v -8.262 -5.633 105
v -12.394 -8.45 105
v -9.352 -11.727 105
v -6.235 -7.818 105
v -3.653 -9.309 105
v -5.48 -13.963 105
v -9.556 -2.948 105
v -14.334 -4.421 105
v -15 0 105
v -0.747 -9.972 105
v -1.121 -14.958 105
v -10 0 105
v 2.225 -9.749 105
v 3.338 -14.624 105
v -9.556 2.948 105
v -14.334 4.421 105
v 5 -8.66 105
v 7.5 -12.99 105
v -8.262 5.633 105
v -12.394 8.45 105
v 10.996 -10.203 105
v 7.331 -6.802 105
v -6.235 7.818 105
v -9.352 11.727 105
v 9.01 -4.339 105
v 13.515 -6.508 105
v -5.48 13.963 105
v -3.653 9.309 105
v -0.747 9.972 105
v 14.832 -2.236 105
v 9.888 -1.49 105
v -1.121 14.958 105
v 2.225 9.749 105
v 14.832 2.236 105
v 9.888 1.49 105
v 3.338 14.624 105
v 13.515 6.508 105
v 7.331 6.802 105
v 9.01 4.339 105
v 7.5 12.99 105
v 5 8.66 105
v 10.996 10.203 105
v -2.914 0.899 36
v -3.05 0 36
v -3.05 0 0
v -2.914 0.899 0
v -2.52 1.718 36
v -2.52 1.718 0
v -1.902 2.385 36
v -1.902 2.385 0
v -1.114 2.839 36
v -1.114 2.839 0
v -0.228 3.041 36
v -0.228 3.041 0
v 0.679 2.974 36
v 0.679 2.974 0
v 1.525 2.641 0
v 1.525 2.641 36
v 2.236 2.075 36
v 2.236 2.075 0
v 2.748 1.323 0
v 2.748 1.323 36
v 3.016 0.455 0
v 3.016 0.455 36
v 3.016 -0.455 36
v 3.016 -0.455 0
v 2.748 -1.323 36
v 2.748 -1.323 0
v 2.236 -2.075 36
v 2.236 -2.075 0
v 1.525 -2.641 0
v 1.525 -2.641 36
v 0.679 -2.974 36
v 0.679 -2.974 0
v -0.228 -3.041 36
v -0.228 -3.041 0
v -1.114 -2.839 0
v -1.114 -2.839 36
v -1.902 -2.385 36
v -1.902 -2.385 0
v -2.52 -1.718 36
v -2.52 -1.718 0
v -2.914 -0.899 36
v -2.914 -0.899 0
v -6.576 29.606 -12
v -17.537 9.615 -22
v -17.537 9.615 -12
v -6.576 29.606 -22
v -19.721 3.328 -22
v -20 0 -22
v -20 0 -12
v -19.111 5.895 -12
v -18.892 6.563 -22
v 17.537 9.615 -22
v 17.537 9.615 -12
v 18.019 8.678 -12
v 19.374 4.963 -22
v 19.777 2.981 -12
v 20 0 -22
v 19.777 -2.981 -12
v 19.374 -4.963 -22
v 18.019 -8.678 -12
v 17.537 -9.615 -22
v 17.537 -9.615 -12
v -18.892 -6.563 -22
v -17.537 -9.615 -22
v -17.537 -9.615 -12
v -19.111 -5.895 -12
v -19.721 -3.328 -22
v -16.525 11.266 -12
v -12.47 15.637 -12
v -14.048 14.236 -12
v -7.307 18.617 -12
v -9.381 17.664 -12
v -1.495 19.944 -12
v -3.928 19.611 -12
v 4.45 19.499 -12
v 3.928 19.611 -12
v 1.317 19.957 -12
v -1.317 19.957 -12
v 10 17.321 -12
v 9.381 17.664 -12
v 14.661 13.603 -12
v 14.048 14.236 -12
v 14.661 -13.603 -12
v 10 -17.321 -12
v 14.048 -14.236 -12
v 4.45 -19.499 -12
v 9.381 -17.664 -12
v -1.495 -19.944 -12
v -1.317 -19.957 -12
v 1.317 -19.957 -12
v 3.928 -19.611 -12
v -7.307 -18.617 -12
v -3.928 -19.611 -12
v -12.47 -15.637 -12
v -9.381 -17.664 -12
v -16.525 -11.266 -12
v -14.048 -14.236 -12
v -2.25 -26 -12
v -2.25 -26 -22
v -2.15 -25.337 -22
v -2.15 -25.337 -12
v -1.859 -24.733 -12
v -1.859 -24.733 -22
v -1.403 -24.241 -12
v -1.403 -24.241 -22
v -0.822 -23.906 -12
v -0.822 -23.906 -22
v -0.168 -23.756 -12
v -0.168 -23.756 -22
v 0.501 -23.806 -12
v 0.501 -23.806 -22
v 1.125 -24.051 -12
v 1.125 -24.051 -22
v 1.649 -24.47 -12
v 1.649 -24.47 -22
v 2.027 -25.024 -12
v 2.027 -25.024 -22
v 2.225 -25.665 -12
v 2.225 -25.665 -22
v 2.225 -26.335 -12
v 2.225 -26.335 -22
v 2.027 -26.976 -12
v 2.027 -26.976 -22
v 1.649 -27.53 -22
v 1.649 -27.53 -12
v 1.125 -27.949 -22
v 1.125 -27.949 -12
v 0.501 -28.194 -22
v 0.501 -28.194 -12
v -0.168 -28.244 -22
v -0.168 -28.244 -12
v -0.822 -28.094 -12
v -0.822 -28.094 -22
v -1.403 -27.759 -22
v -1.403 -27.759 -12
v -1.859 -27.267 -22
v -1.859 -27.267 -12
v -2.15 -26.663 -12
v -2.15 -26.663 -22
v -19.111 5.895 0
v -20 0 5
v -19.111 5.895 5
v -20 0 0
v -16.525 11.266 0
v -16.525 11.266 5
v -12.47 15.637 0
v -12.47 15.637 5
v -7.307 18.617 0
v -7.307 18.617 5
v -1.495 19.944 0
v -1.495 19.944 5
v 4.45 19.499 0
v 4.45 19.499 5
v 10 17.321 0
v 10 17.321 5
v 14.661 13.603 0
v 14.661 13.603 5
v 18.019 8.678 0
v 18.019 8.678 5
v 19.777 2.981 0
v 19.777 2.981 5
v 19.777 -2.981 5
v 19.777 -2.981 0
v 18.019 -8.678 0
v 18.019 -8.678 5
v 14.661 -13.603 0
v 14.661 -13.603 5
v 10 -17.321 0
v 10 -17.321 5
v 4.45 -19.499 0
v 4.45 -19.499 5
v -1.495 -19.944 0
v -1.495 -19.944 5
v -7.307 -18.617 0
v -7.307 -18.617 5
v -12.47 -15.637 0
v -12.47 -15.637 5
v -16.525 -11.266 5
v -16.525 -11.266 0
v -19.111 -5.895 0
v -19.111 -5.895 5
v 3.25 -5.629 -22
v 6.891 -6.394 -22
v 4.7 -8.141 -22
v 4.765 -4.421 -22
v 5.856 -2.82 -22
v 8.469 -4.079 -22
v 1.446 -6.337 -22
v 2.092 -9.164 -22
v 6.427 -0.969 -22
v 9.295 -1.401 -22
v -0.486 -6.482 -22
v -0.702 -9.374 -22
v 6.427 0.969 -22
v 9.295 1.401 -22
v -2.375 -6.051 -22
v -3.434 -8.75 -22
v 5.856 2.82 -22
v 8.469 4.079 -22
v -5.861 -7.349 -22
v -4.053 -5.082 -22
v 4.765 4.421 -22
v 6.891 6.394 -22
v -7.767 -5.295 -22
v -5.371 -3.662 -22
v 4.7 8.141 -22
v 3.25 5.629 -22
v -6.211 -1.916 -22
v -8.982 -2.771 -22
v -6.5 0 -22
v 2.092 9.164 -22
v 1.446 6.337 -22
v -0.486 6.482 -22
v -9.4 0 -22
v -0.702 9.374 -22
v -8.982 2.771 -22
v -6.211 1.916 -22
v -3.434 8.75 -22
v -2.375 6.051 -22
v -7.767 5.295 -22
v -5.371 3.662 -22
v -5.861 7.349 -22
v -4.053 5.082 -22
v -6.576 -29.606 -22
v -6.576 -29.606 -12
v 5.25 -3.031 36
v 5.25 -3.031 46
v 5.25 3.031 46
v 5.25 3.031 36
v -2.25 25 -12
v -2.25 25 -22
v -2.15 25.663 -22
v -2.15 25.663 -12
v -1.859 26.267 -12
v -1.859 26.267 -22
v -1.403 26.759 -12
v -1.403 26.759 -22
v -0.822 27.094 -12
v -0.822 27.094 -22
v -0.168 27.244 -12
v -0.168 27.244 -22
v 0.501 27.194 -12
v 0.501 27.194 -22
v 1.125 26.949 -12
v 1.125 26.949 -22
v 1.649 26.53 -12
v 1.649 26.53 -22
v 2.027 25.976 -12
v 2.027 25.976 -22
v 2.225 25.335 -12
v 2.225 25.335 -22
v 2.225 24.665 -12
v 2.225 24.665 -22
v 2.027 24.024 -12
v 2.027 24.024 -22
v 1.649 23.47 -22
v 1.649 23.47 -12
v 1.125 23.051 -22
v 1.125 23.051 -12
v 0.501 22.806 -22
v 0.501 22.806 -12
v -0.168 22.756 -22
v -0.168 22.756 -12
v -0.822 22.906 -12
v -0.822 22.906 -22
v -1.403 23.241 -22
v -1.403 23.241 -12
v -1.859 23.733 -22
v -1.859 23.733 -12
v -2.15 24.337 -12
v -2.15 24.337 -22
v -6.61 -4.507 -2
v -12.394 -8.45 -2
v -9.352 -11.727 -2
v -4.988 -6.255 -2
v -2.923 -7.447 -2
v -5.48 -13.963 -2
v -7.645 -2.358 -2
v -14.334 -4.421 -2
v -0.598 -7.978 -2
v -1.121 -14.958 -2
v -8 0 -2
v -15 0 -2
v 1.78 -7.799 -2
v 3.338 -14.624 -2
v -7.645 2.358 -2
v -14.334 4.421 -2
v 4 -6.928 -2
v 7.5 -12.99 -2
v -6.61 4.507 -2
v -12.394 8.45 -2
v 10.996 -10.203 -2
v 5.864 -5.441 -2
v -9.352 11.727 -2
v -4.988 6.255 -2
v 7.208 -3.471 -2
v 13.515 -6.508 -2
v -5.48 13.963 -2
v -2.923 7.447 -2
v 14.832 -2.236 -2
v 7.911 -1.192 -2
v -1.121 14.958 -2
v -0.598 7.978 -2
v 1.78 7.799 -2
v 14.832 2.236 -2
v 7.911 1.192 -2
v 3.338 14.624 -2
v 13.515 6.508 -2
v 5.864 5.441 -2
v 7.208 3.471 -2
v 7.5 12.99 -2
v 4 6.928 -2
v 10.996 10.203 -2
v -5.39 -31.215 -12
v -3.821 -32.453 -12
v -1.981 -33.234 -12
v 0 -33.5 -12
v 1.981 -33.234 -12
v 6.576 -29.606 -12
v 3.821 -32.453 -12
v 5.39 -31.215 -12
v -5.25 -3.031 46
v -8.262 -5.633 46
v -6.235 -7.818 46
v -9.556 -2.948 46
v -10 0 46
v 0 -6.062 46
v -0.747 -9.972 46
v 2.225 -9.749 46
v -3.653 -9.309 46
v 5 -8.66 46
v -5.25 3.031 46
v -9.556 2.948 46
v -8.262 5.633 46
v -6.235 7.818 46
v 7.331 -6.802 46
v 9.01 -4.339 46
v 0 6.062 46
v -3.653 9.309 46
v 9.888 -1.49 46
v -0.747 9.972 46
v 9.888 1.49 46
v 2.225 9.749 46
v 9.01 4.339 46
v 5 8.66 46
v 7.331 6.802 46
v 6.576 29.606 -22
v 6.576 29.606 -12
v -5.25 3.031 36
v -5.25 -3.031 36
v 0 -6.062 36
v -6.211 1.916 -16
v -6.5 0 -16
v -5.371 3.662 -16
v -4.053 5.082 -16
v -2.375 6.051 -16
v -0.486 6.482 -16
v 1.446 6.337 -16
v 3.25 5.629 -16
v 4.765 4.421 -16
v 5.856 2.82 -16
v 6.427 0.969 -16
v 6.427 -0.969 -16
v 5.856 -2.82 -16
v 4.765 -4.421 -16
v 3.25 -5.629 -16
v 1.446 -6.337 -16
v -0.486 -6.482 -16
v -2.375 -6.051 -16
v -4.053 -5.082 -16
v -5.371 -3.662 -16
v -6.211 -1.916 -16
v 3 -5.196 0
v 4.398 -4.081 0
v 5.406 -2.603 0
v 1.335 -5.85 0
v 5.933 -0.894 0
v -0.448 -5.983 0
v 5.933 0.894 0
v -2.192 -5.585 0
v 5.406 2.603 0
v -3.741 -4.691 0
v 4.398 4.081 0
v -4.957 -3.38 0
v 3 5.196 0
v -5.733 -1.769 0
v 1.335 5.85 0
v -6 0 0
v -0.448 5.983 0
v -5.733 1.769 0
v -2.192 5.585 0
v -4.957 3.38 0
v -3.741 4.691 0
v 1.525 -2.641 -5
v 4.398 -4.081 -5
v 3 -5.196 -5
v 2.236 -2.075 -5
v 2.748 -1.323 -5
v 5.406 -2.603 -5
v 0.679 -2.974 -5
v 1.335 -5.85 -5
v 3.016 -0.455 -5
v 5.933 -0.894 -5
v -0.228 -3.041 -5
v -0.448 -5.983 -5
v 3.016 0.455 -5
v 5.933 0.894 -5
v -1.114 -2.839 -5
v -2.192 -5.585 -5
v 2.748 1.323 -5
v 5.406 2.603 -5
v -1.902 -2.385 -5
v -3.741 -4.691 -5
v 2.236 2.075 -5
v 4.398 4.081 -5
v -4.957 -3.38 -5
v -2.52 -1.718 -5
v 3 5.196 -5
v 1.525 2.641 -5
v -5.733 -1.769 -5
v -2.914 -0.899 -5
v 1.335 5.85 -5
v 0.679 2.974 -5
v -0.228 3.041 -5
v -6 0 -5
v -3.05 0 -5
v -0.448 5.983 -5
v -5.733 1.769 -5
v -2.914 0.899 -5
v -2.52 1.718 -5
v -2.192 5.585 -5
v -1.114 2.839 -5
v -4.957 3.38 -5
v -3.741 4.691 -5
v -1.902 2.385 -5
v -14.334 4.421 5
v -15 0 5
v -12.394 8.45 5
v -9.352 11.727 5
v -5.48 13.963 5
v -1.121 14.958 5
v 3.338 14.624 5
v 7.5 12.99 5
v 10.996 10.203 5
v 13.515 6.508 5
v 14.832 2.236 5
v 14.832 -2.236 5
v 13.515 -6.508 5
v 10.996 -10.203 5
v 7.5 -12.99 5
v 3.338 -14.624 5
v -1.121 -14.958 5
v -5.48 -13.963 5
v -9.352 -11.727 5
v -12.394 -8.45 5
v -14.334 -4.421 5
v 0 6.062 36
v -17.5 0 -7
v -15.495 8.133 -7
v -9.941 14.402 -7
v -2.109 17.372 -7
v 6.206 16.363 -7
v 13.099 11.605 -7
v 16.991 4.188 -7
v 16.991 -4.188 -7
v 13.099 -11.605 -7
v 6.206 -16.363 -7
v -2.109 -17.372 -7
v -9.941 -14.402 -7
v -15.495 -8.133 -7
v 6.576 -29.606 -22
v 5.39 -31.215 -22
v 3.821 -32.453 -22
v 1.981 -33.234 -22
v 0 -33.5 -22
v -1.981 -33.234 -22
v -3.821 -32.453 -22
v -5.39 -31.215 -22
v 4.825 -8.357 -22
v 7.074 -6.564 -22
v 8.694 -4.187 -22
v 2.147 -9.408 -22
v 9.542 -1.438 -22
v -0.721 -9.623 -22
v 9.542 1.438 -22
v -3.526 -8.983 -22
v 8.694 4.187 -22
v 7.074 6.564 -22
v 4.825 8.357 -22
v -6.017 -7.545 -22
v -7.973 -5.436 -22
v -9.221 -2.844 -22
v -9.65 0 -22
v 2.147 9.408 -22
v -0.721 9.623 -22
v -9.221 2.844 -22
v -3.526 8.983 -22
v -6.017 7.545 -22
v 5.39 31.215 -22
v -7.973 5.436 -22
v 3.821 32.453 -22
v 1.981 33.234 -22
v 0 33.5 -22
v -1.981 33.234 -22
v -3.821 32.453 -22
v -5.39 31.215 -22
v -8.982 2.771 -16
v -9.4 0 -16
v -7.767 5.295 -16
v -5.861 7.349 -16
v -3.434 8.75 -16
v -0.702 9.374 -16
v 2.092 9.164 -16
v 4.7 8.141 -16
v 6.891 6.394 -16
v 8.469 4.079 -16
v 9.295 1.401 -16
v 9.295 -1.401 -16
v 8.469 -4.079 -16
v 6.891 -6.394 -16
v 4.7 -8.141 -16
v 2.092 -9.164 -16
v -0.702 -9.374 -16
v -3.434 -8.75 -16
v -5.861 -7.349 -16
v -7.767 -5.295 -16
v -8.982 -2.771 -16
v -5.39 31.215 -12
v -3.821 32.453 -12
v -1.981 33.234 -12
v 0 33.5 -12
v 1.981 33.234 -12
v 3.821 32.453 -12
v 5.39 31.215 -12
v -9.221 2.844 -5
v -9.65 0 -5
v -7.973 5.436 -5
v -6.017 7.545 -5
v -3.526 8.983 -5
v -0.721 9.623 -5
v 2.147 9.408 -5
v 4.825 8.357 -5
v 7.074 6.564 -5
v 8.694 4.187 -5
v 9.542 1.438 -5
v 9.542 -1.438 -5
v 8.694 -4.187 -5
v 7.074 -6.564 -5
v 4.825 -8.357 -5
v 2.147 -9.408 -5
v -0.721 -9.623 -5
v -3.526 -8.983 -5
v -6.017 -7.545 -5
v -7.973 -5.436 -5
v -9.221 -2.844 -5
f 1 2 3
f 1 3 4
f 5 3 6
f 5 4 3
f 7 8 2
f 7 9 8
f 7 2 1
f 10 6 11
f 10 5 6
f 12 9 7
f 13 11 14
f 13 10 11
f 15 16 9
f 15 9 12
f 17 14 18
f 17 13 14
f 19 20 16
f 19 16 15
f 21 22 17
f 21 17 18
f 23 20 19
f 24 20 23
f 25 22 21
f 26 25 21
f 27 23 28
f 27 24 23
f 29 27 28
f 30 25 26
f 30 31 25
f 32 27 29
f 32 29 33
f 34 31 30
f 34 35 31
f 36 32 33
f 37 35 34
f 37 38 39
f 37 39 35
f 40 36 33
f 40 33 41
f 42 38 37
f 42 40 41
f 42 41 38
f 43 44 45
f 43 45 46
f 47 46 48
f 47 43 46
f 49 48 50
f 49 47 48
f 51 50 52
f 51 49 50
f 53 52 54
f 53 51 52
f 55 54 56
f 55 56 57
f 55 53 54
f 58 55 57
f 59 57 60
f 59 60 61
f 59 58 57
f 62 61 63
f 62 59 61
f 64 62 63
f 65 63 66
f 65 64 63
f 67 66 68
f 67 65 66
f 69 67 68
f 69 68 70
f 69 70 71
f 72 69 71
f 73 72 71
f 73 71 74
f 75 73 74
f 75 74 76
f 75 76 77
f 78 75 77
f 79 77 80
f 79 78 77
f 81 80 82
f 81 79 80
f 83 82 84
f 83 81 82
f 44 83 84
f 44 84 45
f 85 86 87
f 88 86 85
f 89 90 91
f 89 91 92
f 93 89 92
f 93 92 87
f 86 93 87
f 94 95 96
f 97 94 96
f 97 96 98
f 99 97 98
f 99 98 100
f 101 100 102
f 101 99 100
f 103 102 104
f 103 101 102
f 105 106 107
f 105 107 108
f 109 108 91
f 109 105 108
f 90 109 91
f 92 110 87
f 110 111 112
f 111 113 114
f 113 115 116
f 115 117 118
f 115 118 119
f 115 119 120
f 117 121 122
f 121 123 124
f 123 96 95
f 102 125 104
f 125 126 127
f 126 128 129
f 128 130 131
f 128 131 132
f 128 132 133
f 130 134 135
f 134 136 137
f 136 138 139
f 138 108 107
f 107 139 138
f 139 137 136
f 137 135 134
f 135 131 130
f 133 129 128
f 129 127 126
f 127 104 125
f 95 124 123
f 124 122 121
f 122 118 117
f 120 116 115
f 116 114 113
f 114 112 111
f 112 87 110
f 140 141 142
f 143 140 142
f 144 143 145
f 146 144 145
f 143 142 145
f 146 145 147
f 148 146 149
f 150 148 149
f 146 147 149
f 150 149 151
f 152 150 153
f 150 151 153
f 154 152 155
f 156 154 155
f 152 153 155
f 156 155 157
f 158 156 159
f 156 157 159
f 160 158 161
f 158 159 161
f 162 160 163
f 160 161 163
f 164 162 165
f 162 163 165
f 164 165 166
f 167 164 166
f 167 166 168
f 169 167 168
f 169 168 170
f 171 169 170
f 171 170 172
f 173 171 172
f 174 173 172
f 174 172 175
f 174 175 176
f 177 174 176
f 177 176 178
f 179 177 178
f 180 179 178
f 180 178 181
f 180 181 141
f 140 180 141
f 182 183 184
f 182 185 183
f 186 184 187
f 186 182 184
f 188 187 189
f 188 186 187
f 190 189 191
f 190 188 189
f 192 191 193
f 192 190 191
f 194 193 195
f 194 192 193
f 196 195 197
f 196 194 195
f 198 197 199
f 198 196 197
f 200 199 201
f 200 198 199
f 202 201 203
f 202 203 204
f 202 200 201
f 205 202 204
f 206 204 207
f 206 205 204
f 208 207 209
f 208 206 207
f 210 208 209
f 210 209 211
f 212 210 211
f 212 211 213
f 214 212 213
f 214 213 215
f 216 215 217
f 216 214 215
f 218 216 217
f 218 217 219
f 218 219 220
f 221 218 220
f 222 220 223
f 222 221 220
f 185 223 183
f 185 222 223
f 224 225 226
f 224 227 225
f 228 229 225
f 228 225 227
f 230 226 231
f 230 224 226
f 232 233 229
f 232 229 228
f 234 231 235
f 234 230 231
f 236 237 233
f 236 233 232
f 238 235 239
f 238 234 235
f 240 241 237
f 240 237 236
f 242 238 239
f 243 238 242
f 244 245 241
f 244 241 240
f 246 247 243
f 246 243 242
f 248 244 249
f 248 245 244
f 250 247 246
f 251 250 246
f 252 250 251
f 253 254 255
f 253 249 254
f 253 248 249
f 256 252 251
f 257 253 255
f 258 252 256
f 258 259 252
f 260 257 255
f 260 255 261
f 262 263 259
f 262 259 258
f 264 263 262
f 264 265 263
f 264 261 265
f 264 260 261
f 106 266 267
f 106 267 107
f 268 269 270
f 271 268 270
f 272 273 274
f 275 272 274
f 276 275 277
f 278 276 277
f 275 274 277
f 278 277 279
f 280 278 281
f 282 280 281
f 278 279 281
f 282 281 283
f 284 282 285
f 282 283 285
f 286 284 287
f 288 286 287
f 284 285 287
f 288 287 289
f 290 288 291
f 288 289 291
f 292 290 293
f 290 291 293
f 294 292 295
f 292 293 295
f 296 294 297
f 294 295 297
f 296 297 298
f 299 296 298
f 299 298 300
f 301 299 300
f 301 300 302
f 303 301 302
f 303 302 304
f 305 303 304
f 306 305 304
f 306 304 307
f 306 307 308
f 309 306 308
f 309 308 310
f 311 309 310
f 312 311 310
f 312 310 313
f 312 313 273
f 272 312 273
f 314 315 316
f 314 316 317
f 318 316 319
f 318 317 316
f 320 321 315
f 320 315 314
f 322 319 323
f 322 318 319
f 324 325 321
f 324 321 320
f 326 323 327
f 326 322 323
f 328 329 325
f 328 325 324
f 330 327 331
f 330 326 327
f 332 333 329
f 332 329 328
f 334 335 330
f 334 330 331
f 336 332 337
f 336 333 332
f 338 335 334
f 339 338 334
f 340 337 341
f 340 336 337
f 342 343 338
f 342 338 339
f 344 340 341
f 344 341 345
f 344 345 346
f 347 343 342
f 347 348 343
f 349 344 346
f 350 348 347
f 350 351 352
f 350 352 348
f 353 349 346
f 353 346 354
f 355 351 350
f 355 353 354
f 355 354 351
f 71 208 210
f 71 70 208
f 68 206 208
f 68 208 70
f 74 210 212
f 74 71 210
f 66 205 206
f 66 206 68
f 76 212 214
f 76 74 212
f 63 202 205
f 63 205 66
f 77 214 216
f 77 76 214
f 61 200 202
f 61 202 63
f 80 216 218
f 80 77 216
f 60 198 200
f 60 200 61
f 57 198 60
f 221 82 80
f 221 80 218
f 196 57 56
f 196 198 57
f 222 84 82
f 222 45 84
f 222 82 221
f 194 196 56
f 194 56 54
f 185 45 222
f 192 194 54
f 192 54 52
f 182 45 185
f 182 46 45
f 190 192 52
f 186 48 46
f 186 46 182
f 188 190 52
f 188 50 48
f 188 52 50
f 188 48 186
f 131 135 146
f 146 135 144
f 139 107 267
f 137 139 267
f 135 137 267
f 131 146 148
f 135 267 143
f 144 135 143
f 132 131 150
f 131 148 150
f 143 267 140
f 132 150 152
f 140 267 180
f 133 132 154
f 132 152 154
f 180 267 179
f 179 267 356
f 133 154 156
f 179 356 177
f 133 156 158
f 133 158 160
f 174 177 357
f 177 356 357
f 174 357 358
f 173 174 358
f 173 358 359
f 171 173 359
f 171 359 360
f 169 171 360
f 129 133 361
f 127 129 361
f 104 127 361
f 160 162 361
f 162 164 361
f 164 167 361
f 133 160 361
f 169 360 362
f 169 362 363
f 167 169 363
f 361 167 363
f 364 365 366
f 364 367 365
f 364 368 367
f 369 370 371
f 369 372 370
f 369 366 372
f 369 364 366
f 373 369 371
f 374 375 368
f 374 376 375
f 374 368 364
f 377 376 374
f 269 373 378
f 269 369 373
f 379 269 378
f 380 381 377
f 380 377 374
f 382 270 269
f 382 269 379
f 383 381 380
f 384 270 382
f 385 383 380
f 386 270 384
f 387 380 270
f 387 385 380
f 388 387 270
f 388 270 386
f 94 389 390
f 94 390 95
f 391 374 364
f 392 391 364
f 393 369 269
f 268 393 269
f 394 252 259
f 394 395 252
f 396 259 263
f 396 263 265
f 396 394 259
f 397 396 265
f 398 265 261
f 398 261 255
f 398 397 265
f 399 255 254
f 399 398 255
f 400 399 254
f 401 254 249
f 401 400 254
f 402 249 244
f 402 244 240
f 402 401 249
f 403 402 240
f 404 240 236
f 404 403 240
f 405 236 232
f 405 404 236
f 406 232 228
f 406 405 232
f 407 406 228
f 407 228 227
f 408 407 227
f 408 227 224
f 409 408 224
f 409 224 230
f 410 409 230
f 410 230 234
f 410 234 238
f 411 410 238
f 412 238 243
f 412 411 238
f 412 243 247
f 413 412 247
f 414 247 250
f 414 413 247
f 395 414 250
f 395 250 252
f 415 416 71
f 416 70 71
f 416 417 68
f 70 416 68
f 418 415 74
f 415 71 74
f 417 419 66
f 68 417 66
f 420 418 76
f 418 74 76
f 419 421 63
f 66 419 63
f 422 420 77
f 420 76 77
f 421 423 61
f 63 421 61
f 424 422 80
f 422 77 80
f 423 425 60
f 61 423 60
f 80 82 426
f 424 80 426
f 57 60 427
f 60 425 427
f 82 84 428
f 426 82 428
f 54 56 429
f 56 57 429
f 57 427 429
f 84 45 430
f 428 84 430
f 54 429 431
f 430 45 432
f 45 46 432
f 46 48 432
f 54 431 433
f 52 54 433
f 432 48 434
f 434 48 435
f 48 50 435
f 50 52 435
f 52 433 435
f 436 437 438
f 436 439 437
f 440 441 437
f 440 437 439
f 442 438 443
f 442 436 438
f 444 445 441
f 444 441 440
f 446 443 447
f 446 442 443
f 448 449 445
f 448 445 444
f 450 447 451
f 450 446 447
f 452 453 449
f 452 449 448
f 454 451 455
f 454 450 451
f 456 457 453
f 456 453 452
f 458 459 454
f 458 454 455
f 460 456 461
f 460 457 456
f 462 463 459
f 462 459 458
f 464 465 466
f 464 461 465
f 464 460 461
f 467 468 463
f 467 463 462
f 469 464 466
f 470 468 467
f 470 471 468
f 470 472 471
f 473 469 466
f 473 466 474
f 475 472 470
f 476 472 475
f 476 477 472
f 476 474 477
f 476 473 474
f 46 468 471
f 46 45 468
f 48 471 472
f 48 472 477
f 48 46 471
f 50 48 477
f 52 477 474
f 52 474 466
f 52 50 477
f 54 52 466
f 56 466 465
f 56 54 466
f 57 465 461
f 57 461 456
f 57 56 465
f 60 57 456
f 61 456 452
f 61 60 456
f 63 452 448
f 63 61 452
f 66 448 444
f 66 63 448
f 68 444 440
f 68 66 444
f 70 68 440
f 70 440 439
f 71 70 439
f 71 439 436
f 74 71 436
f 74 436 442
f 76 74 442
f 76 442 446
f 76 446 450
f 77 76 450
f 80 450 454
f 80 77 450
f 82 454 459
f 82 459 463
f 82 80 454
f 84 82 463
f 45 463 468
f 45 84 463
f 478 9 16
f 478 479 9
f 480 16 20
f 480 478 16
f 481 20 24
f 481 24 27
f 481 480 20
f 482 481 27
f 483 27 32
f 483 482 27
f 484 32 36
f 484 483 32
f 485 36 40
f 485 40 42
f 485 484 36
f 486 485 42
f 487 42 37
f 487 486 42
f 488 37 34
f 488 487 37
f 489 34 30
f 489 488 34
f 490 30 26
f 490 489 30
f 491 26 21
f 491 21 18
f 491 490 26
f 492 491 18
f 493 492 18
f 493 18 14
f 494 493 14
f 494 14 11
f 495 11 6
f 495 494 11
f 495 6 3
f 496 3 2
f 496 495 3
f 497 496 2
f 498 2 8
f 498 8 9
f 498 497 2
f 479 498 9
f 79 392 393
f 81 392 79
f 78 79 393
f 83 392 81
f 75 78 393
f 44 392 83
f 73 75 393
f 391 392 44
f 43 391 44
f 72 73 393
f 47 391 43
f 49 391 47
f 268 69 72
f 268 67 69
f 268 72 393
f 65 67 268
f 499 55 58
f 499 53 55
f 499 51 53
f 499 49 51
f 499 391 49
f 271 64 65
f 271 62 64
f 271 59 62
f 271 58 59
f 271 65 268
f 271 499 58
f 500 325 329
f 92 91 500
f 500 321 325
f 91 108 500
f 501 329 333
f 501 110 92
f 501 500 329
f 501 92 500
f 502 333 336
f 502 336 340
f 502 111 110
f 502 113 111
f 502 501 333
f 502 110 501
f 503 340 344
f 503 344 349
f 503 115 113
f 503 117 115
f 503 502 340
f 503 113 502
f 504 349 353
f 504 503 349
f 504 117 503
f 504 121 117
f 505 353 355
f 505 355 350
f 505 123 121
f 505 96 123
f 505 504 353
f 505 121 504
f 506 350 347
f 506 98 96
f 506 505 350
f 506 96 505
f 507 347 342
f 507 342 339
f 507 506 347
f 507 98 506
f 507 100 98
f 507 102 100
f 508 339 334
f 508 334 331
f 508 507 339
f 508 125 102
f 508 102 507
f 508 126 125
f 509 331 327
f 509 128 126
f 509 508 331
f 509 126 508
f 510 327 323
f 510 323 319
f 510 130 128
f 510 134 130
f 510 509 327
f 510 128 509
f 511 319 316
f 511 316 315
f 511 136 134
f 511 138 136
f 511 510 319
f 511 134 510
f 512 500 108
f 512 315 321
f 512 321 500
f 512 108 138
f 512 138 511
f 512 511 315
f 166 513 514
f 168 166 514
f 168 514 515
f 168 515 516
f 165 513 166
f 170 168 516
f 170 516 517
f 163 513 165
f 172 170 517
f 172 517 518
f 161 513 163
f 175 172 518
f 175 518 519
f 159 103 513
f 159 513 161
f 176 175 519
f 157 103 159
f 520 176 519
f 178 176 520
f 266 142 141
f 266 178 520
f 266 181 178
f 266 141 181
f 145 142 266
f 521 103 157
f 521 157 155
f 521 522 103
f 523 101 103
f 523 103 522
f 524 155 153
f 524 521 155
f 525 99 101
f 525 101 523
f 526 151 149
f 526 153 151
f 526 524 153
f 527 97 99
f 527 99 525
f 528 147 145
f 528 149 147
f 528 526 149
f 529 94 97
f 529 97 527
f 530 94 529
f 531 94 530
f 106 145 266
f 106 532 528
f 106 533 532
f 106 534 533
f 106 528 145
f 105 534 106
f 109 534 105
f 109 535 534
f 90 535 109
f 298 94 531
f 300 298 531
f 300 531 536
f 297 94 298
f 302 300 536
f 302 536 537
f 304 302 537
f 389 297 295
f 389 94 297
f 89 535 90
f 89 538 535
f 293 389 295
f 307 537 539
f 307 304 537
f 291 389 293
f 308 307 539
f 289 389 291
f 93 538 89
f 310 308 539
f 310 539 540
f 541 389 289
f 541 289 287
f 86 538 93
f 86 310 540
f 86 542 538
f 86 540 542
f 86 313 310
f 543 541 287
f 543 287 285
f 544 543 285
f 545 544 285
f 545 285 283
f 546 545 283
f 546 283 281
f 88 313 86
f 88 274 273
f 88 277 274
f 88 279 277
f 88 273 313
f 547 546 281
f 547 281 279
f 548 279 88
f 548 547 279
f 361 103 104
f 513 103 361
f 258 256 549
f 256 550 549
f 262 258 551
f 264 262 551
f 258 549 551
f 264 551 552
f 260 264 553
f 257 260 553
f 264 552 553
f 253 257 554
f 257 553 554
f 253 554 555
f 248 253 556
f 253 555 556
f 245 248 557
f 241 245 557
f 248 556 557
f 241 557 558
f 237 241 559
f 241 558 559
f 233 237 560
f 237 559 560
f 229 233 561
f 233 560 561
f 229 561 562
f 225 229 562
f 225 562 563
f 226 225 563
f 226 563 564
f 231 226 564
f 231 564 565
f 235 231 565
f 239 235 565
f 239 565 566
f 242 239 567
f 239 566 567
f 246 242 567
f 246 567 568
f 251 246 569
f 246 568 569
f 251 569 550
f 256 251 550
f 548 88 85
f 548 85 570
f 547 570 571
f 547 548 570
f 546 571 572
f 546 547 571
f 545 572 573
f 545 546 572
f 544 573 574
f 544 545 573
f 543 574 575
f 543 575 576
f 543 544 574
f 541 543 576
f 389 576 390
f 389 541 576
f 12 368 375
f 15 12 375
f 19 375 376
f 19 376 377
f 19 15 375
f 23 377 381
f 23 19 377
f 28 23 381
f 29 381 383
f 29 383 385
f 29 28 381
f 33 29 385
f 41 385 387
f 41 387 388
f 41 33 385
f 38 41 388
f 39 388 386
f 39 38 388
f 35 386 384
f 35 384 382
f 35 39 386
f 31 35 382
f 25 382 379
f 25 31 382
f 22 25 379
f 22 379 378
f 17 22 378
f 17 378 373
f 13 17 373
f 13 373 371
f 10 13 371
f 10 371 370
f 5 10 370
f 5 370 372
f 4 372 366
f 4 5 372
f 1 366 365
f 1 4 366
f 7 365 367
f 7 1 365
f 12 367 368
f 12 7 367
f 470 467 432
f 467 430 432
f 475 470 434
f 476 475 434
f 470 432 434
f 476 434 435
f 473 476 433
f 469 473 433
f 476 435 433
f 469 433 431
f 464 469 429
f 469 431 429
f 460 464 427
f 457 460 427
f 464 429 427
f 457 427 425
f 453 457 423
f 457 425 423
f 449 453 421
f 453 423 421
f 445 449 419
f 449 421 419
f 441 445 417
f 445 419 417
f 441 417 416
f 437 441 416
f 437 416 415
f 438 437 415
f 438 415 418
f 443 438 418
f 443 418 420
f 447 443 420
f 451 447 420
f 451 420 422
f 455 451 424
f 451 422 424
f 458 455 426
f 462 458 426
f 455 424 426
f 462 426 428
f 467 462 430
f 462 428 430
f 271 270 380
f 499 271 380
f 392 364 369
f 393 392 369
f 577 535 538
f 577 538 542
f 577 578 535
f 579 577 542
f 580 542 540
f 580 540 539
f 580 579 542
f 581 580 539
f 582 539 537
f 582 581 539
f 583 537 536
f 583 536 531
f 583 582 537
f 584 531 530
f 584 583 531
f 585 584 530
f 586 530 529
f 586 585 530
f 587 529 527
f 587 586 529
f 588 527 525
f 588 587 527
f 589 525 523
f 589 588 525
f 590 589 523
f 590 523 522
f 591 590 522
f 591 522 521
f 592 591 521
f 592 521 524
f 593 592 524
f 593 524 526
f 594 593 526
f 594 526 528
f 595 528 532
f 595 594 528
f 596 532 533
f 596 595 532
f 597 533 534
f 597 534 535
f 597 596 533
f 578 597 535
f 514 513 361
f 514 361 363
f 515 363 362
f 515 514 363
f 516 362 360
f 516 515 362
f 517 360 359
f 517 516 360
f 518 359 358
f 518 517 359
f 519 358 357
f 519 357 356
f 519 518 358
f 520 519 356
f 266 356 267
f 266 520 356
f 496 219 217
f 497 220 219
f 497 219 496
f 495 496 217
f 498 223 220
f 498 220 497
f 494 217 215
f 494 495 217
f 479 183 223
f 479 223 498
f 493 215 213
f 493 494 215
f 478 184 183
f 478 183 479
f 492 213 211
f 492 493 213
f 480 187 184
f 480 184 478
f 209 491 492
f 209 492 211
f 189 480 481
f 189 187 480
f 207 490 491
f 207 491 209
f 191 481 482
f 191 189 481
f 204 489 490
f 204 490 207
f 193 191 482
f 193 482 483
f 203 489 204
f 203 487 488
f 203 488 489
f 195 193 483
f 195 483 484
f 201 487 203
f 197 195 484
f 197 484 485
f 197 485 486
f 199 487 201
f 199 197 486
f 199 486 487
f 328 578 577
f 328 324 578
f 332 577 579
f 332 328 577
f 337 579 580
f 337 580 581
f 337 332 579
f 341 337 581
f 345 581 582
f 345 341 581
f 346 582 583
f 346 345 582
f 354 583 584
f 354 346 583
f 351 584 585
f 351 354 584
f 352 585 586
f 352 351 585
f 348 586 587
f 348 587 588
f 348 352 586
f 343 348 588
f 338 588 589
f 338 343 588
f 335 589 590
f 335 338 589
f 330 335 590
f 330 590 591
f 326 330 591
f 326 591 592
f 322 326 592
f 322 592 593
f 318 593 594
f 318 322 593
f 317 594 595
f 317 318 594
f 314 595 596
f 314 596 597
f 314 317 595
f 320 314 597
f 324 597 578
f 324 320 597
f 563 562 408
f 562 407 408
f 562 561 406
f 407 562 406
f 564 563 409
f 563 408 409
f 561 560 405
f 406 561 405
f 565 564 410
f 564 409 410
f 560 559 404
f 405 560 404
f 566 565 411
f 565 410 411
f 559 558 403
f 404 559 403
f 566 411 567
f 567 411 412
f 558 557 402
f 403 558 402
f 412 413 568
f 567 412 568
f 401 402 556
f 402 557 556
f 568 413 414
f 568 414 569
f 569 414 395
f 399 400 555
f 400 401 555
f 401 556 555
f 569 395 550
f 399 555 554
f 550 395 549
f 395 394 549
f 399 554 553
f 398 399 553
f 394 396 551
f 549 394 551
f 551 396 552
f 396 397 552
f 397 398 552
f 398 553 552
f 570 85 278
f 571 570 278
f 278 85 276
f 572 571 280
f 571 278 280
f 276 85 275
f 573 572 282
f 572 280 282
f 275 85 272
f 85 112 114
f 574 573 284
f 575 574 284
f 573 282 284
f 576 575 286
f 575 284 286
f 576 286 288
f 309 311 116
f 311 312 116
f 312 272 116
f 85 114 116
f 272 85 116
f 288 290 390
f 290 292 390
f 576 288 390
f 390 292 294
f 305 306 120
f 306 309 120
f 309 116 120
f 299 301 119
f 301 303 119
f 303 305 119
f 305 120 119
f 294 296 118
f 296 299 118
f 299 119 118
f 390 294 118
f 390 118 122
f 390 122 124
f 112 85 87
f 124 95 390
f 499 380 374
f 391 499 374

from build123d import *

# Parameters (mm, degrees)
F3_DEPTH  = 10
F0_W      = 2.95
F0_H      = 5
F0_W_2    = 2.9
F0_H_2    = 6
F7_DEPTH  = 10
F9_D      = 4.5
F10_SIZE2 = 9.99999
F10_SIZE  = 4.99999


# Not quite as in the source:
# - a fillet or chamfer is up to 0.001 mm smaller than in the source, because OpenCascade refuses the exact size
# - a feature of the source that left no trace in its solid (it failed there, or was rolled back) is left out


with BuildPart() as f1:
    # F0 (on Front) → F1 (revolve)
    with BuildSketch(Plane.XZ):
        Polygon((-20, 5), (-20, 0), (-6, 0), (-3.05, 0), (-3.05, 46), (-10, 46), (-10, 105), (-15, 105), (-15, 5), align=None)
    revolve(axis=Axis((0, 0, -11.1144582044), (0, 0, -1)))

    # F2 (on face) → F3 (cut)
    with BuildSketch(Plane.XY.offset(46)):
        Polygon((0, -6.0621778265), (5.25, -3.0310889132), (5.25, 3.0310889132), (0, 6.0621778265), (-5.25, 3.0310889132), (-5.25, -3.0310889132), align=None)
    extrude(amount=-F3_DEPTH, mode=Mode.SUBTRACT)


with BuildPart() as f4:
    # F0 (on Front) → F4 (revolve)
    with BuildSketch(Plane.XZ):
        with Locations((-4.525, -2.5)):
            Rectangle(F0_W, F0_H)
    revolve(axis=Axis((0, 0, -11.1144582044), (0, 0, -1)))


with BuildPart() as f5:
    # F0 (on Front) → F5 (revolve)
    with BuildSketch(Plane.XZ):
        Polygon((-9.65, -5), (-8, -2), (-20, -2), (-20, -22), (-9.65, -22), align=None)
    revolve(axis=Axis((0, 0, -11.1144582044), (0, 0, -1)))

    # F6 (on face) → F7 (join)
    with BuildSketch(Plane(origin=(0, 0, -22), x_dir=(1, 0, 0), z_dir=(0, 0, -1))):
        with BuildLine():
            ThreePointArc((-3.9275020998, -19.6105769231), (-11.8387740457, -16.1196597078), (-17.5369432541, -9.6153846154))
            Line((-17.5369432541, -9.6153846154), (-6.5763537203, -29.6057692308))
            ThreePointArc((-6.5763537203, -29.6057692308), (-7.249738898, -24.0787280488), (-3.9275020998, -19.6105769231))
        make_face()
        with BuildLine():
            ThreePointArc((-3.9275020998, -19.6105769231), (-7.249738898, -24.0787280488), (-6.5763537203, -29.6057692308))
            ThreePointArc((-6.5763537203, -29.6057692308), (0, -33.5), (6.5763537203, -29.6057692308))
            ThreePointArc((6.5763537203, -29.6057692308), (7.2654199088, -27.8610947179), (7.5, -26))
            ThreePointArc((7.5, -26), (6.5462304324, -22.3398268995), (3.9275020998, -19.6105769231))
            ThreePointArc((3.9275020998, -19.6105769231), (0, -20), (-3.9275020998, -19.6105769231))
        make_face()
        with BuildLine():
            Line((6.5763537203, -29.6057692308), (17.5369432541, -9.6153846154))
            ThreePointArc((17.5369432541, -9.6153846154), (11.8387740457, -16.1196597078), (3.9275020998, -19.6105769231))
            ThreePointArc((3.9275020998, -19.6105769231), (6.5462304324, -22.3398268995), (7.5, -26))
            ThreePointArc((7.5, -26), (7.2654199088, -27.8610947179), (6.5763537203, -29.6057692308))
        make_face()
        with BuildLine():
            ThreePointArc((3.9275020998, 19.6105769231), (6.5462304324, 22.3398268995), (7.5, 26))
            ThreePointArc((7.5, 26), (7.2654199088, 27.8610947179), (6.5763537203, 29.6057692308))
            ThreePointArc((6.5763537203, 29.6057692308), (0, 33.5), (-6.5763537203, 29.6057692308))
            ThreePointArc((-6.5763537203, 29.6057692308), (-7.249738898, 24.0787280488), (-3.9275020998, 19.6105769231))
            ThreePointArc((-3.9275020998, 19.6105769231), (0, 20), (3.9275020998, 19.6105769231))
        make_face()
        with BuildLine():
            ThreePointArc((6.5763537203, 29.6057692308), (7.2654199088, 27.8610947179), (7.5, 26))
            ThreePointArc((7.5, 26), (6.5462304324, 22.3398268995), (3.9275020998, 19.6105769231))
            ThreePointArc((3.9275020998, 19.6105769231), (11.8387740457, 16.1196597078), (17.5369432541, 9.6153846154))
            Line((17.5369432541, 9.6153846154), (6.5763537203, 29.6057692308))
        make_face()
        with BuildLine():
            ThreePointArc((-3.9275020998, 19.6105769231), (-7.249738898, 24.0787280488), (-6.5763537203, 29.6057692308))
            Line((-6.5763537203, 29.6057692308), (-17.5369432541, 9.6153846154))
            ThreePointArc((-17.5369432541, 9.6153846154), (-11.8387740457, 16.1196597078), (-3.9275020998, 19.6105769231))
        make_face()
    extrude(amount=-F7_DEPTH)

    # F9 (through all)
    with Locations(Plane.XY.offset(-12)):
        with Locations((0, -26), (0, 25)):
            Hole(F9_D / 2)

    # F10 (size 5 and 10 in the source; OpenCascade refuses exactly that, so slightly less here)
    f10_edges = [f5.edges().sort_by_distance(p)[0] for p in [
        (20, 0, -2),
    ]]
    chamfer(f10_edges, length=F10_SIZE, length2=F10_SIZE2)


with BuildPart() as f5b:
    # F0 (on Front) → F5, piece 2 (revolve)
    with BuildSketch(Plane.XZ):
        with Locations((-7.95, -19)):
            Rectangle(F0_W_2, F0_H_2)
    revolve(axis=Axis((0, 0, -11.1144582044), (0, 0, -1)))


solid = Compound([f1.part, f4.part, f5.part, f5b.part])
